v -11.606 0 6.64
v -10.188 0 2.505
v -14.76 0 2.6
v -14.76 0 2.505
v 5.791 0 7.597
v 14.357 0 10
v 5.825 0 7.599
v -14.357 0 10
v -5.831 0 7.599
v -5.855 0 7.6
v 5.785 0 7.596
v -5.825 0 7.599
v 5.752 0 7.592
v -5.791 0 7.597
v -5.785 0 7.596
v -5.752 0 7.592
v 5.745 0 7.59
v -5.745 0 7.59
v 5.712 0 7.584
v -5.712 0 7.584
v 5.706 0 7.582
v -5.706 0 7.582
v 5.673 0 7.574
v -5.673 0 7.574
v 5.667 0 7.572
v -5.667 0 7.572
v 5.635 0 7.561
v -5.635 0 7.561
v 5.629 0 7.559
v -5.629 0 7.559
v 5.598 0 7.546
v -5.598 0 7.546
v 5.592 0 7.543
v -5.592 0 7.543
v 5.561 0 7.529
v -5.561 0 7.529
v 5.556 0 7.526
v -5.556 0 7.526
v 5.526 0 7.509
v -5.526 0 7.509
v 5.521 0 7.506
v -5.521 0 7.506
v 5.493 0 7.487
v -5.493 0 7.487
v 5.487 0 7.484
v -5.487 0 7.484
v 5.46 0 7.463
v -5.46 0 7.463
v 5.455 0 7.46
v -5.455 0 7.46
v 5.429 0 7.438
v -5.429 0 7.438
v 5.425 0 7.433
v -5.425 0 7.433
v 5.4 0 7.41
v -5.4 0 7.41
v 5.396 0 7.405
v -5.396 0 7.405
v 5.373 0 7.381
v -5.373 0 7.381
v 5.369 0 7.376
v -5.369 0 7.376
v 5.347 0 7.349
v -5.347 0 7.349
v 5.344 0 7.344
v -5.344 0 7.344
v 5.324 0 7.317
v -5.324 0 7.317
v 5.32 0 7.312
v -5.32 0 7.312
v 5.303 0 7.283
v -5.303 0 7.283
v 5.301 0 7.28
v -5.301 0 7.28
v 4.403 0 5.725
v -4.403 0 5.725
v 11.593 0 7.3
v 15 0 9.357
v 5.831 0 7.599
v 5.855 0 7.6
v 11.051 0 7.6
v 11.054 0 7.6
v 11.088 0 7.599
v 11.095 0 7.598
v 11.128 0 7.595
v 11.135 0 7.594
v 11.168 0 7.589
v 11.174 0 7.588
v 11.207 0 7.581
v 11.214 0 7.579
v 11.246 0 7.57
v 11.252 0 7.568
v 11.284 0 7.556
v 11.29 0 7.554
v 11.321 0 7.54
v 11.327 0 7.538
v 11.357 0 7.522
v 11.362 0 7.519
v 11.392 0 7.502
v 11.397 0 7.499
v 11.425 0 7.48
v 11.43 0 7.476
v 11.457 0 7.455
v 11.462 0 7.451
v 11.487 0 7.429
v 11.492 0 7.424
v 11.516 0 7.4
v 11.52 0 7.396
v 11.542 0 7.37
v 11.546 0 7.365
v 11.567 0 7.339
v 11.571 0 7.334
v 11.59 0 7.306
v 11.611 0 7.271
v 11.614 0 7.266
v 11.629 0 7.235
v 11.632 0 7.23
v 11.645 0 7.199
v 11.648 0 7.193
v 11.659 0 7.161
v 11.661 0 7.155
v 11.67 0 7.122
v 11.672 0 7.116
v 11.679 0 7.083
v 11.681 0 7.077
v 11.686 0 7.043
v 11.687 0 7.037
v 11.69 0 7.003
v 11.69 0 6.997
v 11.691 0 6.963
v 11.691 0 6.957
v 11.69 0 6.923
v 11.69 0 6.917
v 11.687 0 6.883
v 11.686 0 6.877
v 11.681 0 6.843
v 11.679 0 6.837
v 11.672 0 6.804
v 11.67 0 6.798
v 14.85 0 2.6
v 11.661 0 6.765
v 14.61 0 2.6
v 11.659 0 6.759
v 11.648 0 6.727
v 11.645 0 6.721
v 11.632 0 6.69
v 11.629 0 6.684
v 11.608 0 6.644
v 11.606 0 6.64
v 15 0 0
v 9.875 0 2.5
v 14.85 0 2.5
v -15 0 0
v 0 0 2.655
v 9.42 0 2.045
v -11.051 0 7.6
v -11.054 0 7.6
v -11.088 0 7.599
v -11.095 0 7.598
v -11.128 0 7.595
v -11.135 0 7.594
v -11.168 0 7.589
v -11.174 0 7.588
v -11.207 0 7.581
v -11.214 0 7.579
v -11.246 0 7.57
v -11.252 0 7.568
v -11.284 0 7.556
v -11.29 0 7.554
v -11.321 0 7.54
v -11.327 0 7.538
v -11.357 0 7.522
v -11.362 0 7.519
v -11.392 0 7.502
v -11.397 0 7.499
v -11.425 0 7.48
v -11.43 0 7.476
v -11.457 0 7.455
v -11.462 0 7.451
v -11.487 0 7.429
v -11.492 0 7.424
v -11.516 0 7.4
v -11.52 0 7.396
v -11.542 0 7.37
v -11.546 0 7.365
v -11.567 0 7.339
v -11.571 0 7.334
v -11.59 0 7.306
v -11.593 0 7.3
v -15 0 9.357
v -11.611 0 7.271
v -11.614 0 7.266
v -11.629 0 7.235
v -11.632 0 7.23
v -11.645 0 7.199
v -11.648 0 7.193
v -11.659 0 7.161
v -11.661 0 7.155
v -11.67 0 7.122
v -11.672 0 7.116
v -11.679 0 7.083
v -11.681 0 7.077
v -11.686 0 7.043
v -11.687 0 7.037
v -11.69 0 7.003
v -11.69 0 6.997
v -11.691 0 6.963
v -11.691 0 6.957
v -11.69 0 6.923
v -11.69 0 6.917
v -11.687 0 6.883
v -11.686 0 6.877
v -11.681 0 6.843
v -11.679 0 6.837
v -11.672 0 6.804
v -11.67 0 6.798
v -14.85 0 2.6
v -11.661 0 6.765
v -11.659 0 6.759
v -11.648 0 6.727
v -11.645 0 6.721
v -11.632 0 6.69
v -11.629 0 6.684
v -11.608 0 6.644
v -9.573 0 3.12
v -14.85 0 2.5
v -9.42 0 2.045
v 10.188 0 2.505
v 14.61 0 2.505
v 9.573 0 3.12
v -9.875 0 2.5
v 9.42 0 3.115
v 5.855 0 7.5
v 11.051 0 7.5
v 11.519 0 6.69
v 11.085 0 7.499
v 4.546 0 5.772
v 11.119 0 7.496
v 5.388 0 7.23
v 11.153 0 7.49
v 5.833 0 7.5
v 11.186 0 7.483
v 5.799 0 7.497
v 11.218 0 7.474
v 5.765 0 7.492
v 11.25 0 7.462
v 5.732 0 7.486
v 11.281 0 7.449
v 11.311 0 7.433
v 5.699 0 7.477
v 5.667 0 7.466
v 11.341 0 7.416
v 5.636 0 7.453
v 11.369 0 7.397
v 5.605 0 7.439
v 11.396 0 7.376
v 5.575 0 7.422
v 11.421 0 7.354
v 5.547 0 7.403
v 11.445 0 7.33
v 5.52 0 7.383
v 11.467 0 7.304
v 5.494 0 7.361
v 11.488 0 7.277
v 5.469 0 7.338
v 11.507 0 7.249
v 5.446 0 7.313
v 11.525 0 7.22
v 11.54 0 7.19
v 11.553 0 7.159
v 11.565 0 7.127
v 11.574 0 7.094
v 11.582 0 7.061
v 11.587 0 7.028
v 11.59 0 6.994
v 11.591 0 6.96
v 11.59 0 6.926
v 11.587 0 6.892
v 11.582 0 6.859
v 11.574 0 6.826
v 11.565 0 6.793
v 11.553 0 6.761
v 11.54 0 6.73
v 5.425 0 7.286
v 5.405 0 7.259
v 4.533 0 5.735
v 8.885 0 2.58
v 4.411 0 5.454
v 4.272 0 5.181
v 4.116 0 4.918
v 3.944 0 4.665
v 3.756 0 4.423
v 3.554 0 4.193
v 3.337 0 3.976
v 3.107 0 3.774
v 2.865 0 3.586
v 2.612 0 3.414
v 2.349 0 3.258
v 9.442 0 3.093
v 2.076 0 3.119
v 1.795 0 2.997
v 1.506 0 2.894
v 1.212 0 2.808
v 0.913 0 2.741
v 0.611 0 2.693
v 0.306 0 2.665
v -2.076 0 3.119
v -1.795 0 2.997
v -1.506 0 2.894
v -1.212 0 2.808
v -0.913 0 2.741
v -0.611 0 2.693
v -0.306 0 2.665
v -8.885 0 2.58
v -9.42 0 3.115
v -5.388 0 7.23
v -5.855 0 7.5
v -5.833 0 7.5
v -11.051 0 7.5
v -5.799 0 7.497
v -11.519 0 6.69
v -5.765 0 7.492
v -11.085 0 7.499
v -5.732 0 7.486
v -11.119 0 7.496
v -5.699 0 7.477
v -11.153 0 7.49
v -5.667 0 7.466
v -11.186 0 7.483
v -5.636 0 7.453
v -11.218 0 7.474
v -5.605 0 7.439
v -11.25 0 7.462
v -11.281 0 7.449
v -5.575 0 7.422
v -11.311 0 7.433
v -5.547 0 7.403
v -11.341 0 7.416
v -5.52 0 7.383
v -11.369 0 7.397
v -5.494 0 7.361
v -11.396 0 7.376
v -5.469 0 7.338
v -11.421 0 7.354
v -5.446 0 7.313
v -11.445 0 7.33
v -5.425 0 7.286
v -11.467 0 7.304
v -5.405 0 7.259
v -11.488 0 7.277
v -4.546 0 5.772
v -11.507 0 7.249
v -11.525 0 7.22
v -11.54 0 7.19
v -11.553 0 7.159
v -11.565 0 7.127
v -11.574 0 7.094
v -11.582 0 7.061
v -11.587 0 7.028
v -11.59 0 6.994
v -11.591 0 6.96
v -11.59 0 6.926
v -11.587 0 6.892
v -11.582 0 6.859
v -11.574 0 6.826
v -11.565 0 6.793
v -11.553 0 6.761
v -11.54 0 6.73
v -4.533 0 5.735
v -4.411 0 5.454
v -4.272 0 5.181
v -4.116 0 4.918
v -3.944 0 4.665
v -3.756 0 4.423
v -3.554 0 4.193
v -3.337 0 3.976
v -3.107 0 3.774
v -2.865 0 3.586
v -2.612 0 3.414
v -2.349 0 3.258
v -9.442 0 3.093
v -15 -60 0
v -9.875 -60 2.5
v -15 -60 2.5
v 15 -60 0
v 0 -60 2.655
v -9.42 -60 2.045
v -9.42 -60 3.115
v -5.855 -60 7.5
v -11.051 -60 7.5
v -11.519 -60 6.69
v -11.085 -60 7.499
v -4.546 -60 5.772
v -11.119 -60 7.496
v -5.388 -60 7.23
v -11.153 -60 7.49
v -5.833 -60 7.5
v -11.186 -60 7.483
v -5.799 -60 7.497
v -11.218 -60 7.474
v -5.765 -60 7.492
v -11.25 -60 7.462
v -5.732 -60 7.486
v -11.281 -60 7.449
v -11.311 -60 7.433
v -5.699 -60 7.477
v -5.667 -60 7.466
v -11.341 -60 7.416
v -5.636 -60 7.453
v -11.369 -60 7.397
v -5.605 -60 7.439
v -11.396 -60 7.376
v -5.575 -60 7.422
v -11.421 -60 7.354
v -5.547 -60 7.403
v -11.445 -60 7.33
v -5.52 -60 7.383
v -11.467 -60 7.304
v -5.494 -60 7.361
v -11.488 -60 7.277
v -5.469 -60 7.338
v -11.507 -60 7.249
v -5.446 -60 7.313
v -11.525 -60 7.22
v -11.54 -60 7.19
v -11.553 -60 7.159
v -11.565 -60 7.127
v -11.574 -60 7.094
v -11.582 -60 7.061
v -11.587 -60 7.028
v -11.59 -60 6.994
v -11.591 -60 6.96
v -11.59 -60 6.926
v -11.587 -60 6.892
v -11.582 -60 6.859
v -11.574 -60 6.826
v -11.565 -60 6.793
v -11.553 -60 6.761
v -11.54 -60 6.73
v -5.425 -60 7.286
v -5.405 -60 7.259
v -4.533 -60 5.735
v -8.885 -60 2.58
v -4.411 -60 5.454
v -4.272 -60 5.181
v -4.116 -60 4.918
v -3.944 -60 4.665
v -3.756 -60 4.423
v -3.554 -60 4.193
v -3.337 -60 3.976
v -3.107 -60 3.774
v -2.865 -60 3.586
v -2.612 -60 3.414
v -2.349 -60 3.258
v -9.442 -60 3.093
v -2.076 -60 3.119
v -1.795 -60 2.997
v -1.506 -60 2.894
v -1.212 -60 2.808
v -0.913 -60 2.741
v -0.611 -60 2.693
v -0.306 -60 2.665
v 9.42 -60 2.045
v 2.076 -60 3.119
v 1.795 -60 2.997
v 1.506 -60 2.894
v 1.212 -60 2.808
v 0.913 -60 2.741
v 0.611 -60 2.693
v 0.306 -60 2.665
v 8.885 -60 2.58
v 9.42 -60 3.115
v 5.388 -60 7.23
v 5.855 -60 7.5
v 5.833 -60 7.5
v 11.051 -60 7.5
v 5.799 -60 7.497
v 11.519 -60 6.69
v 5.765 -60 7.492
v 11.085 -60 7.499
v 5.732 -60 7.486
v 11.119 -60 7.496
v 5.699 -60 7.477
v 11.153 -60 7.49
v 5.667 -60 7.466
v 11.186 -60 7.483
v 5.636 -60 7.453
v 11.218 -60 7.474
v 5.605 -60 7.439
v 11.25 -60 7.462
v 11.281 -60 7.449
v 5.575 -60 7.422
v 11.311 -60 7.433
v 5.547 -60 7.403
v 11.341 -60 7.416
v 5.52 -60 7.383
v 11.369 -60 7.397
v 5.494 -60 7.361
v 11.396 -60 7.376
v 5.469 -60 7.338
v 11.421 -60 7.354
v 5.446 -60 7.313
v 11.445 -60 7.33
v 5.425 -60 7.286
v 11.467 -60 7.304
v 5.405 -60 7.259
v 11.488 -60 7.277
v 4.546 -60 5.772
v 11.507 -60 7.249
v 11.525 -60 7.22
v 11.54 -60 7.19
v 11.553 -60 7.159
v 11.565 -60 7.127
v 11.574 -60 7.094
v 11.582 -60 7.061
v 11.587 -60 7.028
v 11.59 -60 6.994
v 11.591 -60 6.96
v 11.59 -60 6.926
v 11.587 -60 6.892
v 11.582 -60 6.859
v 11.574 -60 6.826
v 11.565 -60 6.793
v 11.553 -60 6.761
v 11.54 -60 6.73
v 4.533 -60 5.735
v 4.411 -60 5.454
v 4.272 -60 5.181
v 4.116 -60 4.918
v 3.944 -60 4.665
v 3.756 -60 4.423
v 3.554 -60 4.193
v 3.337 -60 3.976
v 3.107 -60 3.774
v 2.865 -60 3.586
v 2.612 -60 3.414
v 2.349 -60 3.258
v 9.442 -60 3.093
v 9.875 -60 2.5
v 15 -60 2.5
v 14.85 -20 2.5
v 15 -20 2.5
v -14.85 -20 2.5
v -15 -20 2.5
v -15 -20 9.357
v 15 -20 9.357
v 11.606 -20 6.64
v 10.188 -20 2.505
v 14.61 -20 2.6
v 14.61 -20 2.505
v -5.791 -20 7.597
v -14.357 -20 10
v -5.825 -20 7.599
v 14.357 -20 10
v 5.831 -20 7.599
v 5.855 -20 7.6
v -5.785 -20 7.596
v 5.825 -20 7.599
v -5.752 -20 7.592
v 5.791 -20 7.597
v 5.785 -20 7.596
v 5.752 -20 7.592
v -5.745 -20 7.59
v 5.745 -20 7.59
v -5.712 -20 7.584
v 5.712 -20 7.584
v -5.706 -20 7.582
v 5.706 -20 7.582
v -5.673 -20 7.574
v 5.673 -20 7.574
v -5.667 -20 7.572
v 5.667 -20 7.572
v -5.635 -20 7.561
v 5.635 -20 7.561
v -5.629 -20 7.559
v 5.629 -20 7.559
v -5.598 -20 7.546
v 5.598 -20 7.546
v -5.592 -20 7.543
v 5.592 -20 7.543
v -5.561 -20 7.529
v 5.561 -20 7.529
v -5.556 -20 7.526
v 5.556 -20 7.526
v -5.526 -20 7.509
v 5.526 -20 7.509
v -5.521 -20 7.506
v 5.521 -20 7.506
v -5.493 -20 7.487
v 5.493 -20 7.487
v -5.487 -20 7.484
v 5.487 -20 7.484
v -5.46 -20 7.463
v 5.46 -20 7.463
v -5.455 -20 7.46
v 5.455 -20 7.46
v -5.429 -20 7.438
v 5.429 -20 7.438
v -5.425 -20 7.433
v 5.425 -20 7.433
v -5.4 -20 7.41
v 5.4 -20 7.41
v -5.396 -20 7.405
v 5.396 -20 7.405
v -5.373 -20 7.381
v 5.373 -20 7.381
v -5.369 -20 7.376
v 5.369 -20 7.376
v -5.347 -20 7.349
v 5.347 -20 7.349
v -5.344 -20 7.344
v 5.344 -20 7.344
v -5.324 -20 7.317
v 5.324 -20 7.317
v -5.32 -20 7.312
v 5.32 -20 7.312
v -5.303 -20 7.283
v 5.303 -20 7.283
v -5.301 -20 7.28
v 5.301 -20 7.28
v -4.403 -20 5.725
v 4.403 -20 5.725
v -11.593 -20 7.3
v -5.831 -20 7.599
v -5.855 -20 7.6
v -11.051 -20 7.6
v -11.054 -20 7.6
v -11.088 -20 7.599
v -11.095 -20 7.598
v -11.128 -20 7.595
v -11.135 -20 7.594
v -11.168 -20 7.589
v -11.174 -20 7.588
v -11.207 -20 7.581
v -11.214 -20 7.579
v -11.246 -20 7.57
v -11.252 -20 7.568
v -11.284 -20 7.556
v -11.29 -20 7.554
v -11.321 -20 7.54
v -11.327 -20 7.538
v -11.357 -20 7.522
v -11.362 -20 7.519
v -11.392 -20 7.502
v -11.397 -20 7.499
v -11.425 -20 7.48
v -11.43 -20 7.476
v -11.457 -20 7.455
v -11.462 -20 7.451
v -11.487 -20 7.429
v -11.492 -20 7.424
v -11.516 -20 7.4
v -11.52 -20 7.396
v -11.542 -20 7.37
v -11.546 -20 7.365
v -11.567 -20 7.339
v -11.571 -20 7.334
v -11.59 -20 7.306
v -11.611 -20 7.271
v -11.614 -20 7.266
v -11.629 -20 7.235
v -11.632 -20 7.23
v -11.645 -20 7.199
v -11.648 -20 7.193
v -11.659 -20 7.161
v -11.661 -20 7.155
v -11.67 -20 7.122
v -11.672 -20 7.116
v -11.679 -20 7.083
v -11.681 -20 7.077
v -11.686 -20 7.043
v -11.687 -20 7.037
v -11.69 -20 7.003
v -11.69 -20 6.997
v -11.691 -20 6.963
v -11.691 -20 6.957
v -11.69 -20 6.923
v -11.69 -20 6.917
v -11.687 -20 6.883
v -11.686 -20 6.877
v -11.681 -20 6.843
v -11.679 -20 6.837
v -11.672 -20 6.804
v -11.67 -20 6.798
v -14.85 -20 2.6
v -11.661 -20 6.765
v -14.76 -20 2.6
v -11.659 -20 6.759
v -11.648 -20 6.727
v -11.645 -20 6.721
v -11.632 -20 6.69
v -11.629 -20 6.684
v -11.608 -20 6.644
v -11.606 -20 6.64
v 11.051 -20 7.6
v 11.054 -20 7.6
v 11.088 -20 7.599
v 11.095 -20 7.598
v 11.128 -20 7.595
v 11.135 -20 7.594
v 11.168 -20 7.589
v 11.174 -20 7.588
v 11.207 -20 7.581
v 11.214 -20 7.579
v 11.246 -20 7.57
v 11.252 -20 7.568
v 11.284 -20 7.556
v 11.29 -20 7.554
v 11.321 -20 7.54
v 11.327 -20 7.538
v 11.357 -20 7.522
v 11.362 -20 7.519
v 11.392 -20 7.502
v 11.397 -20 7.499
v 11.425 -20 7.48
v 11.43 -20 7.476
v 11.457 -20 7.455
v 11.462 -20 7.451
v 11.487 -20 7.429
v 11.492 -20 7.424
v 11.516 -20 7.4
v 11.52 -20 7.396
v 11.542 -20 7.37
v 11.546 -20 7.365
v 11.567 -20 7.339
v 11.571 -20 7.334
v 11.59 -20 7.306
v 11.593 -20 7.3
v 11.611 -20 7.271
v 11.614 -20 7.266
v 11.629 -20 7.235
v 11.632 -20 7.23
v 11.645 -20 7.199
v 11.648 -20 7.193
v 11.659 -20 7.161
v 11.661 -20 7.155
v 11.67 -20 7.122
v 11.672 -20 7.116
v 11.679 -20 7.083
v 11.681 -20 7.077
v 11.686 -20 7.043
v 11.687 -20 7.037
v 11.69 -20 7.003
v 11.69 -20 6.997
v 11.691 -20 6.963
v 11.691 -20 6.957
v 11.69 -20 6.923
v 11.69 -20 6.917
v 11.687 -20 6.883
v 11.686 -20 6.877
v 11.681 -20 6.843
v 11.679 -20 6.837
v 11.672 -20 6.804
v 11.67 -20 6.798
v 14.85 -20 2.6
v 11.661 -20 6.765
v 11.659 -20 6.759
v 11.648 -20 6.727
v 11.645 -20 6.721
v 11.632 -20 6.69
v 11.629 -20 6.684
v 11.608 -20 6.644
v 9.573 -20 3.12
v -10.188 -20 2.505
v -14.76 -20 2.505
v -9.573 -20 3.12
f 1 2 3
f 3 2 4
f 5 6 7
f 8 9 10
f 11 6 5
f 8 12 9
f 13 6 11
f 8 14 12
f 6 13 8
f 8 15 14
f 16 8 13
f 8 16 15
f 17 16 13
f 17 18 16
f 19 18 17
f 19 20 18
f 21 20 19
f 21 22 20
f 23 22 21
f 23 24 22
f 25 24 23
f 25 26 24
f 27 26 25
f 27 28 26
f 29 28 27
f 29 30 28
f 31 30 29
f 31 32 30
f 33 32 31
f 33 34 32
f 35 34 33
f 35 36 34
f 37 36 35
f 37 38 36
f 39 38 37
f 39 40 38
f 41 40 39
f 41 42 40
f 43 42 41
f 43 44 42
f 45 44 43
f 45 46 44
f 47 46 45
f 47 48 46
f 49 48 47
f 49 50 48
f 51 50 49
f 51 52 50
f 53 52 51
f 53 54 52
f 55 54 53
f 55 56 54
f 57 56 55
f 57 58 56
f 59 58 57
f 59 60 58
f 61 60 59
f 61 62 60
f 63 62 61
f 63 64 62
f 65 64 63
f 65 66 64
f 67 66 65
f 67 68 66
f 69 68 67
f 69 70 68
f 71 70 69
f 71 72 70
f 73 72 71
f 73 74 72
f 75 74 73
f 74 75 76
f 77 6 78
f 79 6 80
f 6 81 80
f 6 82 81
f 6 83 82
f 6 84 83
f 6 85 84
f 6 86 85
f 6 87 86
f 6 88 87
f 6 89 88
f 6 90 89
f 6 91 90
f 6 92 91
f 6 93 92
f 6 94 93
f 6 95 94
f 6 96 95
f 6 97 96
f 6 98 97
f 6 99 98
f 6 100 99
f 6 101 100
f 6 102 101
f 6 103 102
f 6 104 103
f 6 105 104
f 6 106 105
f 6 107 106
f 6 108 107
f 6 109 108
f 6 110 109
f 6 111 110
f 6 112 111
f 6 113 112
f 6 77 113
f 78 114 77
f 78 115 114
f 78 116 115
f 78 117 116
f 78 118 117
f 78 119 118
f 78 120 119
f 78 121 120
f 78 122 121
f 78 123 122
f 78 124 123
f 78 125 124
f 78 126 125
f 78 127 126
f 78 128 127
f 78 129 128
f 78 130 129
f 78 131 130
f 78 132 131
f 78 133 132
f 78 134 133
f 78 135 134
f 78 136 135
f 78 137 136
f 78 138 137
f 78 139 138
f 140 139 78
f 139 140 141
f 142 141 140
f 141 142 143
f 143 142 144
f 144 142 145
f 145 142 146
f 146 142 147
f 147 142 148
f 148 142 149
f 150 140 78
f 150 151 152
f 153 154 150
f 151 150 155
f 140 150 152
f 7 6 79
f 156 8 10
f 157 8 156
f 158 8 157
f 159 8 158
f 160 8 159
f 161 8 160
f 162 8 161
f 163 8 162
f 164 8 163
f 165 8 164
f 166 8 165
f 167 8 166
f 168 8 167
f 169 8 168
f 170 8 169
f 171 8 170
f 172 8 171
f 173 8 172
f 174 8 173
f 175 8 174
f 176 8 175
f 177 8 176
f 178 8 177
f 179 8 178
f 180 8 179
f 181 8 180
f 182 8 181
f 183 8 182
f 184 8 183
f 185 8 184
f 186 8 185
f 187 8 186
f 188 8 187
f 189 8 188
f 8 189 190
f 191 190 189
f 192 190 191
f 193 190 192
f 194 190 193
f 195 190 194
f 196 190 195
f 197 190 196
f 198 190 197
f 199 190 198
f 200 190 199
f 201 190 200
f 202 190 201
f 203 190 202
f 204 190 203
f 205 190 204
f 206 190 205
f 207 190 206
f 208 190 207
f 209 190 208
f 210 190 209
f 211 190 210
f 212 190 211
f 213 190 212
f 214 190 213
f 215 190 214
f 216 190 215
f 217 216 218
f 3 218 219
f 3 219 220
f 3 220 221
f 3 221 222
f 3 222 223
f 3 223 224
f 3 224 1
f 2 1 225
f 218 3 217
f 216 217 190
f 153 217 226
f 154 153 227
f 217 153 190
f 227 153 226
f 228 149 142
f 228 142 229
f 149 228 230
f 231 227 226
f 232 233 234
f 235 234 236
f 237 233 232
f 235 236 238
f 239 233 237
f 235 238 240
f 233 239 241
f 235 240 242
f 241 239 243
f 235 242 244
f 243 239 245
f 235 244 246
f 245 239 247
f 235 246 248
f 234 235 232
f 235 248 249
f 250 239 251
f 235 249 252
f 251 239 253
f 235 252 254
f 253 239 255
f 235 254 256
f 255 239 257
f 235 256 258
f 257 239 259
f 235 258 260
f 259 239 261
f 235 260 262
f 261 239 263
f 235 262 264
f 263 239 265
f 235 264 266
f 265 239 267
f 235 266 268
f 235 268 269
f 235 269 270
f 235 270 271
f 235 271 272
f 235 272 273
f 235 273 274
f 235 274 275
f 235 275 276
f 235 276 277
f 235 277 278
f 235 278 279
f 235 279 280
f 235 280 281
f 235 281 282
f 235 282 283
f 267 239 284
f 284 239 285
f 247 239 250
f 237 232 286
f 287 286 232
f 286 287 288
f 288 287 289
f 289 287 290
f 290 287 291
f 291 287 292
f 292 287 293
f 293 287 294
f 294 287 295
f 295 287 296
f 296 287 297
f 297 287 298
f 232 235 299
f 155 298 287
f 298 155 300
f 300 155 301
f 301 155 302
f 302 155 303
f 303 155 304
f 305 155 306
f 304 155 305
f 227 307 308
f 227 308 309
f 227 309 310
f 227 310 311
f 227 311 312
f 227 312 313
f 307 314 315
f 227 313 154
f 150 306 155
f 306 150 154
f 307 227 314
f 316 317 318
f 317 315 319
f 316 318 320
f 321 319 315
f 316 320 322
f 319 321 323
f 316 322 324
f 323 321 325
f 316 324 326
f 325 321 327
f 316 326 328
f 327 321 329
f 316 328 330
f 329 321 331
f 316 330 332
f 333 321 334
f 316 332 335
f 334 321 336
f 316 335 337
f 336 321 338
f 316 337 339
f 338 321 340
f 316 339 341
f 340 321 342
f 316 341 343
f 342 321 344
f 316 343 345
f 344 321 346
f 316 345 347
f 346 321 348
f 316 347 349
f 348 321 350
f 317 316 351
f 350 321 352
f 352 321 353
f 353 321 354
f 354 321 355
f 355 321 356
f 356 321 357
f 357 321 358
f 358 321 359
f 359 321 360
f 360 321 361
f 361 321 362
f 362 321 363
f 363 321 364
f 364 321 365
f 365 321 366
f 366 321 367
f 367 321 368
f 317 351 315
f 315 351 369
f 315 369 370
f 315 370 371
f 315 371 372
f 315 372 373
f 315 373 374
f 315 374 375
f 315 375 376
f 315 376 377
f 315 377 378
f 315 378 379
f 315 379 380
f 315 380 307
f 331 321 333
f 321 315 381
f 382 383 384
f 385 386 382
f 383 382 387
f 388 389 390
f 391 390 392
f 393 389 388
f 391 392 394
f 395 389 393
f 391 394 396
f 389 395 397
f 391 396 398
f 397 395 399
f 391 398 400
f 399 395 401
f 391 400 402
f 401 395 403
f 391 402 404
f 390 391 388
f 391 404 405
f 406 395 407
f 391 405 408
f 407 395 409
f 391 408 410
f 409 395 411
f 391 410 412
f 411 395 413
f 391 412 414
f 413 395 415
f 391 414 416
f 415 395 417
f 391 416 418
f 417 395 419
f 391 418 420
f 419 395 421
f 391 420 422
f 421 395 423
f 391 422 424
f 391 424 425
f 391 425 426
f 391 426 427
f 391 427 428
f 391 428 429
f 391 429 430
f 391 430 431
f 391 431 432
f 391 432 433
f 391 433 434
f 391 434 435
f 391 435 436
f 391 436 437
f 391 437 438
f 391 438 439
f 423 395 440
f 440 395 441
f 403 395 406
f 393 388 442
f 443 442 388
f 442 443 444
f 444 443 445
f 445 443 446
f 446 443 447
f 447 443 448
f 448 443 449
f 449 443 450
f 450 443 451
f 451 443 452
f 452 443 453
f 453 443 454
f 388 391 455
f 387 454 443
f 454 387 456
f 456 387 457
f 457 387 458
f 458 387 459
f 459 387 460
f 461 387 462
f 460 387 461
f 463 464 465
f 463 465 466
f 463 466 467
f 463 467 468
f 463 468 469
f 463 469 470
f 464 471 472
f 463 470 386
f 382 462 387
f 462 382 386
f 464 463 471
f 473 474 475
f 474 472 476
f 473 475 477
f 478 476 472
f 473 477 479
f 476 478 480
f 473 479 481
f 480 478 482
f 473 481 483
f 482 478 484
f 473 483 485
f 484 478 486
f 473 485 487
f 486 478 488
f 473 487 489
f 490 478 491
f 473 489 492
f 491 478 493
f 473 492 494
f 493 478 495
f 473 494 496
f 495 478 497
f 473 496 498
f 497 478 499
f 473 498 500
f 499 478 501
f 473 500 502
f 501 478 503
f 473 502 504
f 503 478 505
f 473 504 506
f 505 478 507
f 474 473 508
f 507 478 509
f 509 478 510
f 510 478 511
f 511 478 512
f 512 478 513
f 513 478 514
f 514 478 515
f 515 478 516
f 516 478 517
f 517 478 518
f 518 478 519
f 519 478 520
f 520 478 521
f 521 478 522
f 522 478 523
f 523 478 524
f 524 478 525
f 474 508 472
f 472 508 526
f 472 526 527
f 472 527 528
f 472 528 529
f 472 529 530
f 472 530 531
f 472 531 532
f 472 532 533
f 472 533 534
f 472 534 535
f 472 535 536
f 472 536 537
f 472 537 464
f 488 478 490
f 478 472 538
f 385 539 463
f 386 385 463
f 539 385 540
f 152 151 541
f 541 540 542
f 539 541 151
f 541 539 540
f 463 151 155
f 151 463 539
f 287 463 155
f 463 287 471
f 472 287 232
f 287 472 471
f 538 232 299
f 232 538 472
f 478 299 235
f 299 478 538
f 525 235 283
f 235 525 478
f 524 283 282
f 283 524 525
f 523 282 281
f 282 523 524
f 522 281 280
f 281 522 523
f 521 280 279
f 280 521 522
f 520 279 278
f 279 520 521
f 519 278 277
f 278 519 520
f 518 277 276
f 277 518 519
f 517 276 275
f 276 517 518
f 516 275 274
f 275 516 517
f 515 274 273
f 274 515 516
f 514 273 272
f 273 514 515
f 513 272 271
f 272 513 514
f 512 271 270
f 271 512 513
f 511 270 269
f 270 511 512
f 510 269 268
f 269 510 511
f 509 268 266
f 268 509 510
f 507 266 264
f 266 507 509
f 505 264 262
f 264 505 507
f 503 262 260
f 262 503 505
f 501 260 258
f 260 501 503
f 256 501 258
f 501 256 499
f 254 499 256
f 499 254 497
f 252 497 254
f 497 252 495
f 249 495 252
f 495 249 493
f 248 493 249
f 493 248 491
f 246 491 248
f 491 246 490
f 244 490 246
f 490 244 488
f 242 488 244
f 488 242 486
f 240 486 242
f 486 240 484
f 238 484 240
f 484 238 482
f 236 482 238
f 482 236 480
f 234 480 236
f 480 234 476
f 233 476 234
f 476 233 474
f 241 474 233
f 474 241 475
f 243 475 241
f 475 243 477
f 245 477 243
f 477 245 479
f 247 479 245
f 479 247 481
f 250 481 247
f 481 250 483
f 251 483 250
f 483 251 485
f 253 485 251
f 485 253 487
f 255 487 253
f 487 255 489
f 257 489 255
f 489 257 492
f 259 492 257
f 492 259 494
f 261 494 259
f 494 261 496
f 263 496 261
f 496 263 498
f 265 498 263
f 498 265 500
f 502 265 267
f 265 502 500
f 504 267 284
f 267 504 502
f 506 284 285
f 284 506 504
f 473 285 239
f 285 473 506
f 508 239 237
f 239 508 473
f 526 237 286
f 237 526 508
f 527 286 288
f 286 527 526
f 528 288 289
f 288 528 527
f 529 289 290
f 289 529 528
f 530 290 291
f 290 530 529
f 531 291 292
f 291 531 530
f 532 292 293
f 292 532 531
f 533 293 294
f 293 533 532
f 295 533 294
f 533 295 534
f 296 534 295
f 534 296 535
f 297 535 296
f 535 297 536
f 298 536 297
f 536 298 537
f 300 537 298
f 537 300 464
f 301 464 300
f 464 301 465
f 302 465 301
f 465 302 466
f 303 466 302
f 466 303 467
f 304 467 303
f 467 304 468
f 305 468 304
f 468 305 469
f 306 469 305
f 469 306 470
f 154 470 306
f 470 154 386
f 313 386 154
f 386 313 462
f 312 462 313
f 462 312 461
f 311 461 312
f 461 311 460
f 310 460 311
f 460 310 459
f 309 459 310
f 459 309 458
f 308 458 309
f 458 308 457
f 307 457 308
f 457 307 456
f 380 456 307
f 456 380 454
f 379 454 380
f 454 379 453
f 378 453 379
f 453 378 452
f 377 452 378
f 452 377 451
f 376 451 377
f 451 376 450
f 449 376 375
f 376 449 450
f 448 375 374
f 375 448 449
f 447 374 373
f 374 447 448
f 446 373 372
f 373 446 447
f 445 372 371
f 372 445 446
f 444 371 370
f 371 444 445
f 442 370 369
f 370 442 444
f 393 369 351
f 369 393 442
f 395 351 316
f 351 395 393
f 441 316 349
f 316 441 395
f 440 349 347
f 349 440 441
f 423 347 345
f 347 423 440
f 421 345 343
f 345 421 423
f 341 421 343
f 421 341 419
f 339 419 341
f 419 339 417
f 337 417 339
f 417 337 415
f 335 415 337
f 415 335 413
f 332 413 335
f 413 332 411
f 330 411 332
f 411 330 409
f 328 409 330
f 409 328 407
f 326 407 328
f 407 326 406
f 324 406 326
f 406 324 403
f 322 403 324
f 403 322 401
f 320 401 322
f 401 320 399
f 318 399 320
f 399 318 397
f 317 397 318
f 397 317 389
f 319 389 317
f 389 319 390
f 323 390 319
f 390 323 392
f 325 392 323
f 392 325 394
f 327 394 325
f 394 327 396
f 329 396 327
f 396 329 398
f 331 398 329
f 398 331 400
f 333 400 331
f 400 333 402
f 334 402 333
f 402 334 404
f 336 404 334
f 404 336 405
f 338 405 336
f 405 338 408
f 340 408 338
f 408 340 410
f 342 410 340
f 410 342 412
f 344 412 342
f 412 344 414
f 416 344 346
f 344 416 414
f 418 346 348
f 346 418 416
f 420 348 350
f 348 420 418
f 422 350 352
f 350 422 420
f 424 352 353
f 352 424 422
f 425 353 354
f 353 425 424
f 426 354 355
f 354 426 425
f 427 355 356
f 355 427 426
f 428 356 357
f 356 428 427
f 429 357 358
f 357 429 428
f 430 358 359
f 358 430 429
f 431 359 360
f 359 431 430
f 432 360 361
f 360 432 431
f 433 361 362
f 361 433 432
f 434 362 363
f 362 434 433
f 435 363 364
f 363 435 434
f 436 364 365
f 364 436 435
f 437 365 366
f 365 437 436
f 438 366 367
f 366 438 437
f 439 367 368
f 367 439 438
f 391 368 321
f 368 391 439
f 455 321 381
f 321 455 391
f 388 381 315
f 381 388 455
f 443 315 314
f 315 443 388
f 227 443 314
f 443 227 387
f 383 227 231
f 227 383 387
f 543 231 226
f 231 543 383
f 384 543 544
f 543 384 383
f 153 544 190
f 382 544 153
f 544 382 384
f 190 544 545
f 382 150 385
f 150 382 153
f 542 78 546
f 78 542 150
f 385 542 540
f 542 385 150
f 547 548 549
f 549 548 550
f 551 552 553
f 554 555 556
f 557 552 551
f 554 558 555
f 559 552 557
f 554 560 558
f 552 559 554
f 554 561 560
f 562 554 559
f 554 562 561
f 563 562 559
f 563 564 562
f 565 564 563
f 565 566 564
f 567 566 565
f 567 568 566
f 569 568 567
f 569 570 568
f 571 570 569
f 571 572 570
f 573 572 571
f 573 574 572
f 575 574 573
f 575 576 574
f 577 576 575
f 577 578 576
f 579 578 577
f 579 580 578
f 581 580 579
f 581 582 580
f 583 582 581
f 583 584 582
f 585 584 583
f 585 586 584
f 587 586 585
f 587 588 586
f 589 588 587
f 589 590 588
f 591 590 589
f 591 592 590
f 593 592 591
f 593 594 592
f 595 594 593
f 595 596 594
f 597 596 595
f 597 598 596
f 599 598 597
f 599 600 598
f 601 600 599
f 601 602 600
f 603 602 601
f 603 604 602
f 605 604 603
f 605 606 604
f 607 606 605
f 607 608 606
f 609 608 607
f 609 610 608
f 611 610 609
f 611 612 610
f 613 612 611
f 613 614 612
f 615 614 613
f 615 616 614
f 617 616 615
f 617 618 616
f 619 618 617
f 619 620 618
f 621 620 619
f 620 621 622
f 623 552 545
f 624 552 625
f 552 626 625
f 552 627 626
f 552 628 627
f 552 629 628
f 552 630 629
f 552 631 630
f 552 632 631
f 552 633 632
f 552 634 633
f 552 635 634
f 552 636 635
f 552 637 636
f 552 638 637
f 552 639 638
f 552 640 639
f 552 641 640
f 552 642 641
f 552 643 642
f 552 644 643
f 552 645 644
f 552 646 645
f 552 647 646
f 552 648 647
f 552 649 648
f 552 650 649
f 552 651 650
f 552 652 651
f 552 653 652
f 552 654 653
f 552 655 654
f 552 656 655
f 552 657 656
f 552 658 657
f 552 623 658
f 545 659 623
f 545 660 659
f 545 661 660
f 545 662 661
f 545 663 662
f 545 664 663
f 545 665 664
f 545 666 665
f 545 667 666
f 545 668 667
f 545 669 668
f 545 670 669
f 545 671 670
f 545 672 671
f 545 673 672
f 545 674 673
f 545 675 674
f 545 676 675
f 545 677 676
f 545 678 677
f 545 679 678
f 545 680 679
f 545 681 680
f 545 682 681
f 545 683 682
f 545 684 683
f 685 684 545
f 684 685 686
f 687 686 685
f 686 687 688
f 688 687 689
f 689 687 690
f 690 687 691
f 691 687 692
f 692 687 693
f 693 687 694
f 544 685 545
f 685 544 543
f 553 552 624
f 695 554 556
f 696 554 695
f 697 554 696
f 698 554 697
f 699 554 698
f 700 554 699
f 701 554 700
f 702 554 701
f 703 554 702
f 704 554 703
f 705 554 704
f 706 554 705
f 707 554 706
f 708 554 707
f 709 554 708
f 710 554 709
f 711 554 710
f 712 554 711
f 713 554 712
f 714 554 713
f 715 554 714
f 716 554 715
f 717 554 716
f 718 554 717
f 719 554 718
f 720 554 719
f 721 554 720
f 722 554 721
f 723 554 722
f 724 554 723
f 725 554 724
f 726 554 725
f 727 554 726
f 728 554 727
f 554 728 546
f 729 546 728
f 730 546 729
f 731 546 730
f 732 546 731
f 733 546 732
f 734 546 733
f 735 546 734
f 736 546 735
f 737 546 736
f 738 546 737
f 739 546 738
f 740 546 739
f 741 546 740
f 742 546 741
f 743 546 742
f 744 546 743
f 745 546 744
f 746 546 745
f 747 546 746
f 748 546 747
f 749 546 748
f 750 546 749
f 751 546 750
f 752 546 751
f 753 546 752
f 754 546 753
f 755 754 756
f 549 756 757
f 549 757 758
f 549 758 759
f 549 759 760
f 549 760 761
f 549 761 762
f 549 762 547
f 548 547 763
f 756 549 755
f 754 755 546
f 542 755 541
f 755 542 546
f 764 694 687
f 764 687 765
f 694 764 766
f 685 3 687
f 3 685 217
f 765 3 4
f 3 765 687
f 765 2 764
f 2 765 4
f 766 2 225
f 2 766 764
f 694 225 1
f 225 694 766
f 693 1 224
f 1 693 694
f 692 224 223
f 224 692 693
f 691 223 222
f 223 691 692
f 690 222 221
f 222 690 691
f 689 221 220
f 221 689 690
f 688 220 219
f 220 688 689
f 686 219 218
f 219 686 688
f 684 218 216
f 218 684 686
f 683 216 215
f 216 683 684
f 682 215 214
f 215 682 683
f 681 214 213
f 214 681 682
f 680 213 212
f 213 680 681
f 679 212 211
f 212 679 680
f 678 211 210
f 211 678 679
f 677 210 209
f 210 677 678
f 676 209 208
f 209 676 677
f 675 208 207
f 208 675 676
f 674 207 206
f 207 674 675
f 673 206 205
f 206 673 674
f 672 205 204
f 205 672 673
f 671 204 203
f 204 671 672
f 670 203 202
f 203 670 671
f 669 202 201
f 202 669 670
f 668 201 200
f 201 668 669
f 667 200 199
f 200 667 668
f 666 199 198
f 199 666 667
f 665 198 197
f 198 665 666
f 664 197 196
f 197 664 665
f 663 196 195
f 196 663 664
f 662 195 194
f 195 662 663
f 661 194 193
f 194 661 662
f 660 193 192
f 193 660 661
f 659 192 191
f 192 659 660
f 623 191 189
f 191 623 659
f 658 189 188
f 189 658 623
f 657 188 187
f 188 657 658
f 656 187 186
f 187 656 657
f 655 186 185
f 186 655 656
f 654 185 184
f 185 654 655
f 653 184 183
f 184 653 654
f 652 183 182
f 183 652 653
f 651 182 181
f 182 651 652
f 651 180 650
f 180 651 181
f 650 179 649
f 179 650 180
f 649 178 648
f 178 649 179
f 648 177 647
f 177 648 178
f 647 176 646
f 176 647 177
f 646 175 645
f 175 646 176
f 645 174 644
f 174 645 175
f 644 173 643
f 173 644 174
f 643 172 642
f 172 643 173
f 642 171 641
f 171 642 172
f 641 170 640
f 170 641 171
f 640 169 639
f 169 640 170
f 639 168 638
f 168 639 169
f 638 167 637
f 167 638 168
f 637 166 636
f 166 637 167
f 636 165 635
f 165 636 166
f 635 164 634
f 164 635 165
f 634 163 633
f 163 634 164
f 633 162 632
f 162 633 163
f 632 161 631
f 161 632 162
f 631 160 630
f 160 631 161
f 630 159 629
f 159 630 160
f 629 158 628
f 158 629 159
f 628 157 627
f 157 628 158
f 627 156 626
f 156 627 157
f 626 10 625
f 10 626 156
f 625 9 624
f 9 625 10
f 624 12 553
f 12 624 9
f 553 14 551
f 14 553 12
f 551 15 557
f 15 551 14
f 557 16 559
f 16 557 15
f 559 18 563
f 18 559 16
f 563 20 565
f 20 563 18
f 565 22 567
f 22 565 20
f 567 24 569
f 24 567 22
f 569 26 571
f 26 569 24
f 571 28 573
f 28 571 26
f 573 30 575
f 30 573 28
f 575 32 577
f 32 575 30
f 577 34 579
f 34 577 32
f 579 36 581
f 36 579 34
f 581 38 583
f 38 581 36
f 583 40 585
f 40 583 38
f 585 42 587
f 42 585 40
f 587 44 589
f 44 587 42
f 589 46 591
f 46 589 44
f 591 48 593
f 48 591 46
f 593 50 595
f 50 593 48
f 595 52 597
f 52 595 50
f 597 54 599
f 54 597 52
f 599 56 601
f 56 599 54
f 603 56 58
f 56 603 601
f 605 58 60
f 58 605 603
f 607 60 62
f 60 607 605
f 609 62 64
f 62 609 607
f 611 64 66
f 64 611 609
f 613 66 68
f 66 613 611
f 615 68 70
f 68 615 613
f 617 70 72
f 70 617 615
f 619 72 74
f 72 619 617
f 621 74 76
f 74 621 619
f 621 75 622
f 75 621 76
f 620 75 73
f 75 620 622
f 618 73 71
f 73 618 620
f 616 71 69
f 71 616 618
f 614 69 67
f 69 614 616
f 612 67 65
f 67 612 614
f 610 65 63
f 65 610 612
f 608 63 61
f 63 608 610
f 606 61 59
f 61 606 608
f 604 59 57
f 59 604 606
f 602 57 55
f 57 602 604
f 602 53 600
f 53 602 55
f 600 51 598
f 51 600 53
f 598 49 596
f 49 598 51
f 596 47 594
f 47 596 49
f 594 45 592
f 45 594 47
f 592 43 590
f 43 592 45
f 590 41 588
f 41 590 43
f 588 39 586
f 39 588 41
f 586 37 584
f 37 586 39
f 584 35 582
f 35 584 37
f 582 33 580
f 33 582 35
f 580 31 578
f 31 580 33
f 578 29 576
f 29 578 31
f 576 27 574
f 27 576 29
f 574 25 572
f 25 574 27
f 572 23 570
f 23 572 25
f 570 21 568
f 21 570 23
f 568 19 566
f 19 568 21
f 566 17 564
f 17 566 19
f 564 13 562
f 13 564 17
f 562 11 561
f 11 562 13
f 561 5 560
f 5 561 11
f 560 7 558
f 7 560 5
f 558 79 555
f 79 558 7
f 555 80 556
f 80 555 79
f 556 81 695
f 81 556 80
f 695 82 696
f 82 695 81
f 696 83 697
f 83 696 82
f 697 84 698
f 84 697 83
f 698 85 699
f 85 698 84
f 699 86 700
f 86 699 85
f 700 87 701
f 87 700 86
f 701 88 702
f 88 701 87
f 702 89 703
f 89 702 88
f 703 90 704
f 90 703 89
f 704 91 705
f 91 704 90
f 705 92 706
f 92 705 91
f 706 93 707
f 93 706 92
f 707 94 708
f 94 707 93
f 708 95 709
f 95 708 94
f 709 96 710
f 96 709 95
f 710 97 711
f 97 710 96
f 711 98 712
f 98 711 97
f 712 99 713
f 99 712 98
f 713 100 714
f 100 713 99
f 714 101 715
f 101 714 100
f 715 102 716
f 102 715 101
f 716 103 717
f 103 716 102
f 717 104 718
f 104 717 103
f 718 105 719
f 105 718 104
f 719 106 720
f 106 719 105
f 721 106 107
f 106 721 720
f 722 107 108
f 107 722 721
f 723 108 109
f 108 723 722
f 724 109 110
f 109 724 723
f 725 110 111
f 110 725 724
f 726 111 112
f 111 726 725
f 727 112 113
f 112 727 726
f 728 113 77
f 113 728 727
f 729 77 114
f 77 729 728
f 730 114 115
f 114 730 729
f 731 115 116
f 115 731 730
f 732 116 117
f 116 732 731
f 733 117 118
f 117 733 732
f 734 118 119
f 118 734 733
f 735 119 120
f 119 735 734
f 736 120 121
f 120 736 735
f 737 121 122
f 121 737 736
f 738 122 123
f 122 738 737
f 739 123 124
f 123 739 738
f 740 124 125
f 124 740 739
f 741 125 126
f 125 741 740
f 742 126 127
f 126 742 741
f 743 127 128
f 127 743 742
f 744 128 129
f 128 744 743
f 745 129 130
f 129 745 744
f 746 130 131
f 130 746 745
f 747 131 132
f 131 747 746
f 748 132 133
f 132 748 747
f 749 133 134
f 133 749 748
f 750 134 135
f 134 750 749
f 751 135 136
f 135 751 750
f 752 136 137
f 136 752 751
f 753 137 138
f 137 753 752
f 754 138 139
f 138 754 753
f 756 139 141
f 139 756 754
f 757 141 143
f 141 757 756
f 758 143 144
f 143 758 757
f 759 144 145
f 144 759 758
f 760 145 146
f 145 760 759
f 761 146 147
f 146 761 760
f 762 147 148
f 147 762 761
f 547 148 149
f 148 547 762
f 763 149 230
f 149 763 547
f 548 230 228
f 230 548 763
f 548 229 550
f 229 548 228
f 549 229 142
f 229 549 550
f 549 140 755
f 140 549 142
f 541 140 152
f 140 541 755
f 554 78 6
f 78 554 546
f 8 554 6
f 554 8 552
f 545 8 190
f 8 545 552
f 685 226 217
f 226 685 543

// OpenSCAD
///////////////////////////////////////////
/// OpenSCAD File by Ken_Applications /////
///////////////////////////////////////////

///The 4 Main Parameters below////////
///are for you to experiment with. ///
/////////// Enjoy ////////////////////

Slide_length = 60    ;
Slide_width = 30     ;
clearance = 0.1      ;//Clearance gap between parts... 0.1 default, 
carriage_length= 20   ;

////////////////////////////////////
//Viewing Parameters
$fn = 100    ;// Number of facets
View_parts = 4   ;//////.. 1=View Rail  2=View carriage 3= carriage for printing 4=assembly

////////////////////////////////////









/////..Below Calculations ..////
Slide_height=Slide_width/4;// the slide height is fixed at 1/4 of width
r=Slide_width*0.018;//ratio for size of radius
podfcl=Slide_width*0.22;//position of dovtail from center line
rfbt=(Slide_width/4)*0.3333333;//ratio for base thickness
bcr=Slide_width*0.1625;//blue circle radius


if (View_parts ==1) base_rail_extruded ();
if (View_parts ==2)move_carriage ();
if (View_parts ==3)print_carriage();
if (View_parts ==4)base_rail_extruded ();
if (View_parts ==4) move_carriage ();
   
///////////////////////////////////////////
/////// The Module's used /////////////////
module left_hand_rail(){
difference(){
    rotate(a=-60, v=[0,0,1])
    square([Slide_height*3,Slide_width*0.15],center=true);
    translate([0,(Slide_height*1.5)-r,0]) square([Slide_width,Slide_height*2],center=true);
    translate([0,-(Slide_height*1.5)+r,0]) square([Slide_width,Slide_height*2],center=true);
     }
}



module left_and_right_hand_rail(){
mirror(v= [0, 1, 0] ) { 
translate([podfcl,0,0]) offset(r=r) left_hand_rail();
}
 
translate([-podfcl,0,0]) offset(r=r) left_hand_rail();
}

module base_rail_without_recess(){
 union(){   
square([Slide_width/2,Slide_width/8],true);
 left_and_right_hand_rail(); 
   translate([0,-rfbt,0])  square([Slide_width,Slide_height/3],center=true);
 
 }  
}

module base_rail(){
 difference(){
  base_rail_without_recess();
   translate([0,Slide_width*.126,0])  circle(bcr);
   translate([-Slide_width*0.314,-Slide_width*0.039,0]) rotate(a=45, v=[0,0,1]) square(r*1.4,true);
 translate([Slide_width*0.314,-Slide_width*0.039,0]) rotate(a=45, v=[0,0,1]) square(r*1.4,true);
 }   
    
}


module add_bit (){
    difference(){
    translate([0,Slide_height-rfbt*2,0])  square([Slide_width,Slide_height],center=true); 
    translate([0,Slide_height-clearance-rfbt*2,0]) color("green") square([Slide_width-clearance*3,Slide_height-clearance],center=true);
    } 
}

module top_rail(){
   
  offset(r=-clearance)  
      difference(){
      translate([0,Slide_height-rfbt*2,0])square([Slide_width,Slide_height],center=true); 
      base_rail_without_recess();
    }

  union()
    add_bit();
    
    //fill in bottom gap
    translate([-Slide_width*0.492,-Slide_height*0.166,0]) square([Slide_width*0.165,clearance+0.2],false);
    translate([Slide_width*0.322,-Slide_height*0.166,0]) square([Slide_width*0.165,clearance+0.2],false);
    
 
 }
 
module top_rail_chamfered (){
 difference(){
    top_rail(); 
     
   //draw the chamfer squares
   translate([-Slide_width*0.314,-Slide_width*0.049,0]) rotate(a=45, v=[0,0,1]) square(r*2.6,true);
   translate([Slide_width*0.314,-Slide_width*0.049,0]) rotate(a=45, v=[0,0,1]) square(r*2.6,true);
   translate([-Slide_width*0.5,Slide_width*0.22,0]) rotate(a=45, v=[0,0,1]) square(r*2.6,true);
   translate([Slide_width*0.5,Slide_width*0.22,0]) rotate(a=45, v=[0,0,1]) square(r*2.6,true);
 
 }
 }
 
module base_rail_extruded (){   
translate([0,0,Slide_height/2]) rotate(a=90,v=[1,0,0])linear_extrude(0,0,Slide_length) base_rail();
}
 
module move_carriage (){
   color("Green")translate([0,-0,Slide_height/2]) rotate(a=90,v=[1,0,0])linear_extrude(0,0,carriage_length) top_rail_chamfered();
  }
 
  
 
  
module print_carriage(){
   
 rotate(a=180,v=[0,1,0]) translate([Slide_width+rfbt,0,-rfbt-Slide_height])  move_carriage(); 
   
 } 
 
 
 




//Animate_carriage=1; // 1=Animate  0= No Animation
//if (Animate_carriage==1) translate([0,$t*-Slide_length*1.1,0]) move_carriage();
//if (Animate_carriage==0) move_carriage(); 
 
 
